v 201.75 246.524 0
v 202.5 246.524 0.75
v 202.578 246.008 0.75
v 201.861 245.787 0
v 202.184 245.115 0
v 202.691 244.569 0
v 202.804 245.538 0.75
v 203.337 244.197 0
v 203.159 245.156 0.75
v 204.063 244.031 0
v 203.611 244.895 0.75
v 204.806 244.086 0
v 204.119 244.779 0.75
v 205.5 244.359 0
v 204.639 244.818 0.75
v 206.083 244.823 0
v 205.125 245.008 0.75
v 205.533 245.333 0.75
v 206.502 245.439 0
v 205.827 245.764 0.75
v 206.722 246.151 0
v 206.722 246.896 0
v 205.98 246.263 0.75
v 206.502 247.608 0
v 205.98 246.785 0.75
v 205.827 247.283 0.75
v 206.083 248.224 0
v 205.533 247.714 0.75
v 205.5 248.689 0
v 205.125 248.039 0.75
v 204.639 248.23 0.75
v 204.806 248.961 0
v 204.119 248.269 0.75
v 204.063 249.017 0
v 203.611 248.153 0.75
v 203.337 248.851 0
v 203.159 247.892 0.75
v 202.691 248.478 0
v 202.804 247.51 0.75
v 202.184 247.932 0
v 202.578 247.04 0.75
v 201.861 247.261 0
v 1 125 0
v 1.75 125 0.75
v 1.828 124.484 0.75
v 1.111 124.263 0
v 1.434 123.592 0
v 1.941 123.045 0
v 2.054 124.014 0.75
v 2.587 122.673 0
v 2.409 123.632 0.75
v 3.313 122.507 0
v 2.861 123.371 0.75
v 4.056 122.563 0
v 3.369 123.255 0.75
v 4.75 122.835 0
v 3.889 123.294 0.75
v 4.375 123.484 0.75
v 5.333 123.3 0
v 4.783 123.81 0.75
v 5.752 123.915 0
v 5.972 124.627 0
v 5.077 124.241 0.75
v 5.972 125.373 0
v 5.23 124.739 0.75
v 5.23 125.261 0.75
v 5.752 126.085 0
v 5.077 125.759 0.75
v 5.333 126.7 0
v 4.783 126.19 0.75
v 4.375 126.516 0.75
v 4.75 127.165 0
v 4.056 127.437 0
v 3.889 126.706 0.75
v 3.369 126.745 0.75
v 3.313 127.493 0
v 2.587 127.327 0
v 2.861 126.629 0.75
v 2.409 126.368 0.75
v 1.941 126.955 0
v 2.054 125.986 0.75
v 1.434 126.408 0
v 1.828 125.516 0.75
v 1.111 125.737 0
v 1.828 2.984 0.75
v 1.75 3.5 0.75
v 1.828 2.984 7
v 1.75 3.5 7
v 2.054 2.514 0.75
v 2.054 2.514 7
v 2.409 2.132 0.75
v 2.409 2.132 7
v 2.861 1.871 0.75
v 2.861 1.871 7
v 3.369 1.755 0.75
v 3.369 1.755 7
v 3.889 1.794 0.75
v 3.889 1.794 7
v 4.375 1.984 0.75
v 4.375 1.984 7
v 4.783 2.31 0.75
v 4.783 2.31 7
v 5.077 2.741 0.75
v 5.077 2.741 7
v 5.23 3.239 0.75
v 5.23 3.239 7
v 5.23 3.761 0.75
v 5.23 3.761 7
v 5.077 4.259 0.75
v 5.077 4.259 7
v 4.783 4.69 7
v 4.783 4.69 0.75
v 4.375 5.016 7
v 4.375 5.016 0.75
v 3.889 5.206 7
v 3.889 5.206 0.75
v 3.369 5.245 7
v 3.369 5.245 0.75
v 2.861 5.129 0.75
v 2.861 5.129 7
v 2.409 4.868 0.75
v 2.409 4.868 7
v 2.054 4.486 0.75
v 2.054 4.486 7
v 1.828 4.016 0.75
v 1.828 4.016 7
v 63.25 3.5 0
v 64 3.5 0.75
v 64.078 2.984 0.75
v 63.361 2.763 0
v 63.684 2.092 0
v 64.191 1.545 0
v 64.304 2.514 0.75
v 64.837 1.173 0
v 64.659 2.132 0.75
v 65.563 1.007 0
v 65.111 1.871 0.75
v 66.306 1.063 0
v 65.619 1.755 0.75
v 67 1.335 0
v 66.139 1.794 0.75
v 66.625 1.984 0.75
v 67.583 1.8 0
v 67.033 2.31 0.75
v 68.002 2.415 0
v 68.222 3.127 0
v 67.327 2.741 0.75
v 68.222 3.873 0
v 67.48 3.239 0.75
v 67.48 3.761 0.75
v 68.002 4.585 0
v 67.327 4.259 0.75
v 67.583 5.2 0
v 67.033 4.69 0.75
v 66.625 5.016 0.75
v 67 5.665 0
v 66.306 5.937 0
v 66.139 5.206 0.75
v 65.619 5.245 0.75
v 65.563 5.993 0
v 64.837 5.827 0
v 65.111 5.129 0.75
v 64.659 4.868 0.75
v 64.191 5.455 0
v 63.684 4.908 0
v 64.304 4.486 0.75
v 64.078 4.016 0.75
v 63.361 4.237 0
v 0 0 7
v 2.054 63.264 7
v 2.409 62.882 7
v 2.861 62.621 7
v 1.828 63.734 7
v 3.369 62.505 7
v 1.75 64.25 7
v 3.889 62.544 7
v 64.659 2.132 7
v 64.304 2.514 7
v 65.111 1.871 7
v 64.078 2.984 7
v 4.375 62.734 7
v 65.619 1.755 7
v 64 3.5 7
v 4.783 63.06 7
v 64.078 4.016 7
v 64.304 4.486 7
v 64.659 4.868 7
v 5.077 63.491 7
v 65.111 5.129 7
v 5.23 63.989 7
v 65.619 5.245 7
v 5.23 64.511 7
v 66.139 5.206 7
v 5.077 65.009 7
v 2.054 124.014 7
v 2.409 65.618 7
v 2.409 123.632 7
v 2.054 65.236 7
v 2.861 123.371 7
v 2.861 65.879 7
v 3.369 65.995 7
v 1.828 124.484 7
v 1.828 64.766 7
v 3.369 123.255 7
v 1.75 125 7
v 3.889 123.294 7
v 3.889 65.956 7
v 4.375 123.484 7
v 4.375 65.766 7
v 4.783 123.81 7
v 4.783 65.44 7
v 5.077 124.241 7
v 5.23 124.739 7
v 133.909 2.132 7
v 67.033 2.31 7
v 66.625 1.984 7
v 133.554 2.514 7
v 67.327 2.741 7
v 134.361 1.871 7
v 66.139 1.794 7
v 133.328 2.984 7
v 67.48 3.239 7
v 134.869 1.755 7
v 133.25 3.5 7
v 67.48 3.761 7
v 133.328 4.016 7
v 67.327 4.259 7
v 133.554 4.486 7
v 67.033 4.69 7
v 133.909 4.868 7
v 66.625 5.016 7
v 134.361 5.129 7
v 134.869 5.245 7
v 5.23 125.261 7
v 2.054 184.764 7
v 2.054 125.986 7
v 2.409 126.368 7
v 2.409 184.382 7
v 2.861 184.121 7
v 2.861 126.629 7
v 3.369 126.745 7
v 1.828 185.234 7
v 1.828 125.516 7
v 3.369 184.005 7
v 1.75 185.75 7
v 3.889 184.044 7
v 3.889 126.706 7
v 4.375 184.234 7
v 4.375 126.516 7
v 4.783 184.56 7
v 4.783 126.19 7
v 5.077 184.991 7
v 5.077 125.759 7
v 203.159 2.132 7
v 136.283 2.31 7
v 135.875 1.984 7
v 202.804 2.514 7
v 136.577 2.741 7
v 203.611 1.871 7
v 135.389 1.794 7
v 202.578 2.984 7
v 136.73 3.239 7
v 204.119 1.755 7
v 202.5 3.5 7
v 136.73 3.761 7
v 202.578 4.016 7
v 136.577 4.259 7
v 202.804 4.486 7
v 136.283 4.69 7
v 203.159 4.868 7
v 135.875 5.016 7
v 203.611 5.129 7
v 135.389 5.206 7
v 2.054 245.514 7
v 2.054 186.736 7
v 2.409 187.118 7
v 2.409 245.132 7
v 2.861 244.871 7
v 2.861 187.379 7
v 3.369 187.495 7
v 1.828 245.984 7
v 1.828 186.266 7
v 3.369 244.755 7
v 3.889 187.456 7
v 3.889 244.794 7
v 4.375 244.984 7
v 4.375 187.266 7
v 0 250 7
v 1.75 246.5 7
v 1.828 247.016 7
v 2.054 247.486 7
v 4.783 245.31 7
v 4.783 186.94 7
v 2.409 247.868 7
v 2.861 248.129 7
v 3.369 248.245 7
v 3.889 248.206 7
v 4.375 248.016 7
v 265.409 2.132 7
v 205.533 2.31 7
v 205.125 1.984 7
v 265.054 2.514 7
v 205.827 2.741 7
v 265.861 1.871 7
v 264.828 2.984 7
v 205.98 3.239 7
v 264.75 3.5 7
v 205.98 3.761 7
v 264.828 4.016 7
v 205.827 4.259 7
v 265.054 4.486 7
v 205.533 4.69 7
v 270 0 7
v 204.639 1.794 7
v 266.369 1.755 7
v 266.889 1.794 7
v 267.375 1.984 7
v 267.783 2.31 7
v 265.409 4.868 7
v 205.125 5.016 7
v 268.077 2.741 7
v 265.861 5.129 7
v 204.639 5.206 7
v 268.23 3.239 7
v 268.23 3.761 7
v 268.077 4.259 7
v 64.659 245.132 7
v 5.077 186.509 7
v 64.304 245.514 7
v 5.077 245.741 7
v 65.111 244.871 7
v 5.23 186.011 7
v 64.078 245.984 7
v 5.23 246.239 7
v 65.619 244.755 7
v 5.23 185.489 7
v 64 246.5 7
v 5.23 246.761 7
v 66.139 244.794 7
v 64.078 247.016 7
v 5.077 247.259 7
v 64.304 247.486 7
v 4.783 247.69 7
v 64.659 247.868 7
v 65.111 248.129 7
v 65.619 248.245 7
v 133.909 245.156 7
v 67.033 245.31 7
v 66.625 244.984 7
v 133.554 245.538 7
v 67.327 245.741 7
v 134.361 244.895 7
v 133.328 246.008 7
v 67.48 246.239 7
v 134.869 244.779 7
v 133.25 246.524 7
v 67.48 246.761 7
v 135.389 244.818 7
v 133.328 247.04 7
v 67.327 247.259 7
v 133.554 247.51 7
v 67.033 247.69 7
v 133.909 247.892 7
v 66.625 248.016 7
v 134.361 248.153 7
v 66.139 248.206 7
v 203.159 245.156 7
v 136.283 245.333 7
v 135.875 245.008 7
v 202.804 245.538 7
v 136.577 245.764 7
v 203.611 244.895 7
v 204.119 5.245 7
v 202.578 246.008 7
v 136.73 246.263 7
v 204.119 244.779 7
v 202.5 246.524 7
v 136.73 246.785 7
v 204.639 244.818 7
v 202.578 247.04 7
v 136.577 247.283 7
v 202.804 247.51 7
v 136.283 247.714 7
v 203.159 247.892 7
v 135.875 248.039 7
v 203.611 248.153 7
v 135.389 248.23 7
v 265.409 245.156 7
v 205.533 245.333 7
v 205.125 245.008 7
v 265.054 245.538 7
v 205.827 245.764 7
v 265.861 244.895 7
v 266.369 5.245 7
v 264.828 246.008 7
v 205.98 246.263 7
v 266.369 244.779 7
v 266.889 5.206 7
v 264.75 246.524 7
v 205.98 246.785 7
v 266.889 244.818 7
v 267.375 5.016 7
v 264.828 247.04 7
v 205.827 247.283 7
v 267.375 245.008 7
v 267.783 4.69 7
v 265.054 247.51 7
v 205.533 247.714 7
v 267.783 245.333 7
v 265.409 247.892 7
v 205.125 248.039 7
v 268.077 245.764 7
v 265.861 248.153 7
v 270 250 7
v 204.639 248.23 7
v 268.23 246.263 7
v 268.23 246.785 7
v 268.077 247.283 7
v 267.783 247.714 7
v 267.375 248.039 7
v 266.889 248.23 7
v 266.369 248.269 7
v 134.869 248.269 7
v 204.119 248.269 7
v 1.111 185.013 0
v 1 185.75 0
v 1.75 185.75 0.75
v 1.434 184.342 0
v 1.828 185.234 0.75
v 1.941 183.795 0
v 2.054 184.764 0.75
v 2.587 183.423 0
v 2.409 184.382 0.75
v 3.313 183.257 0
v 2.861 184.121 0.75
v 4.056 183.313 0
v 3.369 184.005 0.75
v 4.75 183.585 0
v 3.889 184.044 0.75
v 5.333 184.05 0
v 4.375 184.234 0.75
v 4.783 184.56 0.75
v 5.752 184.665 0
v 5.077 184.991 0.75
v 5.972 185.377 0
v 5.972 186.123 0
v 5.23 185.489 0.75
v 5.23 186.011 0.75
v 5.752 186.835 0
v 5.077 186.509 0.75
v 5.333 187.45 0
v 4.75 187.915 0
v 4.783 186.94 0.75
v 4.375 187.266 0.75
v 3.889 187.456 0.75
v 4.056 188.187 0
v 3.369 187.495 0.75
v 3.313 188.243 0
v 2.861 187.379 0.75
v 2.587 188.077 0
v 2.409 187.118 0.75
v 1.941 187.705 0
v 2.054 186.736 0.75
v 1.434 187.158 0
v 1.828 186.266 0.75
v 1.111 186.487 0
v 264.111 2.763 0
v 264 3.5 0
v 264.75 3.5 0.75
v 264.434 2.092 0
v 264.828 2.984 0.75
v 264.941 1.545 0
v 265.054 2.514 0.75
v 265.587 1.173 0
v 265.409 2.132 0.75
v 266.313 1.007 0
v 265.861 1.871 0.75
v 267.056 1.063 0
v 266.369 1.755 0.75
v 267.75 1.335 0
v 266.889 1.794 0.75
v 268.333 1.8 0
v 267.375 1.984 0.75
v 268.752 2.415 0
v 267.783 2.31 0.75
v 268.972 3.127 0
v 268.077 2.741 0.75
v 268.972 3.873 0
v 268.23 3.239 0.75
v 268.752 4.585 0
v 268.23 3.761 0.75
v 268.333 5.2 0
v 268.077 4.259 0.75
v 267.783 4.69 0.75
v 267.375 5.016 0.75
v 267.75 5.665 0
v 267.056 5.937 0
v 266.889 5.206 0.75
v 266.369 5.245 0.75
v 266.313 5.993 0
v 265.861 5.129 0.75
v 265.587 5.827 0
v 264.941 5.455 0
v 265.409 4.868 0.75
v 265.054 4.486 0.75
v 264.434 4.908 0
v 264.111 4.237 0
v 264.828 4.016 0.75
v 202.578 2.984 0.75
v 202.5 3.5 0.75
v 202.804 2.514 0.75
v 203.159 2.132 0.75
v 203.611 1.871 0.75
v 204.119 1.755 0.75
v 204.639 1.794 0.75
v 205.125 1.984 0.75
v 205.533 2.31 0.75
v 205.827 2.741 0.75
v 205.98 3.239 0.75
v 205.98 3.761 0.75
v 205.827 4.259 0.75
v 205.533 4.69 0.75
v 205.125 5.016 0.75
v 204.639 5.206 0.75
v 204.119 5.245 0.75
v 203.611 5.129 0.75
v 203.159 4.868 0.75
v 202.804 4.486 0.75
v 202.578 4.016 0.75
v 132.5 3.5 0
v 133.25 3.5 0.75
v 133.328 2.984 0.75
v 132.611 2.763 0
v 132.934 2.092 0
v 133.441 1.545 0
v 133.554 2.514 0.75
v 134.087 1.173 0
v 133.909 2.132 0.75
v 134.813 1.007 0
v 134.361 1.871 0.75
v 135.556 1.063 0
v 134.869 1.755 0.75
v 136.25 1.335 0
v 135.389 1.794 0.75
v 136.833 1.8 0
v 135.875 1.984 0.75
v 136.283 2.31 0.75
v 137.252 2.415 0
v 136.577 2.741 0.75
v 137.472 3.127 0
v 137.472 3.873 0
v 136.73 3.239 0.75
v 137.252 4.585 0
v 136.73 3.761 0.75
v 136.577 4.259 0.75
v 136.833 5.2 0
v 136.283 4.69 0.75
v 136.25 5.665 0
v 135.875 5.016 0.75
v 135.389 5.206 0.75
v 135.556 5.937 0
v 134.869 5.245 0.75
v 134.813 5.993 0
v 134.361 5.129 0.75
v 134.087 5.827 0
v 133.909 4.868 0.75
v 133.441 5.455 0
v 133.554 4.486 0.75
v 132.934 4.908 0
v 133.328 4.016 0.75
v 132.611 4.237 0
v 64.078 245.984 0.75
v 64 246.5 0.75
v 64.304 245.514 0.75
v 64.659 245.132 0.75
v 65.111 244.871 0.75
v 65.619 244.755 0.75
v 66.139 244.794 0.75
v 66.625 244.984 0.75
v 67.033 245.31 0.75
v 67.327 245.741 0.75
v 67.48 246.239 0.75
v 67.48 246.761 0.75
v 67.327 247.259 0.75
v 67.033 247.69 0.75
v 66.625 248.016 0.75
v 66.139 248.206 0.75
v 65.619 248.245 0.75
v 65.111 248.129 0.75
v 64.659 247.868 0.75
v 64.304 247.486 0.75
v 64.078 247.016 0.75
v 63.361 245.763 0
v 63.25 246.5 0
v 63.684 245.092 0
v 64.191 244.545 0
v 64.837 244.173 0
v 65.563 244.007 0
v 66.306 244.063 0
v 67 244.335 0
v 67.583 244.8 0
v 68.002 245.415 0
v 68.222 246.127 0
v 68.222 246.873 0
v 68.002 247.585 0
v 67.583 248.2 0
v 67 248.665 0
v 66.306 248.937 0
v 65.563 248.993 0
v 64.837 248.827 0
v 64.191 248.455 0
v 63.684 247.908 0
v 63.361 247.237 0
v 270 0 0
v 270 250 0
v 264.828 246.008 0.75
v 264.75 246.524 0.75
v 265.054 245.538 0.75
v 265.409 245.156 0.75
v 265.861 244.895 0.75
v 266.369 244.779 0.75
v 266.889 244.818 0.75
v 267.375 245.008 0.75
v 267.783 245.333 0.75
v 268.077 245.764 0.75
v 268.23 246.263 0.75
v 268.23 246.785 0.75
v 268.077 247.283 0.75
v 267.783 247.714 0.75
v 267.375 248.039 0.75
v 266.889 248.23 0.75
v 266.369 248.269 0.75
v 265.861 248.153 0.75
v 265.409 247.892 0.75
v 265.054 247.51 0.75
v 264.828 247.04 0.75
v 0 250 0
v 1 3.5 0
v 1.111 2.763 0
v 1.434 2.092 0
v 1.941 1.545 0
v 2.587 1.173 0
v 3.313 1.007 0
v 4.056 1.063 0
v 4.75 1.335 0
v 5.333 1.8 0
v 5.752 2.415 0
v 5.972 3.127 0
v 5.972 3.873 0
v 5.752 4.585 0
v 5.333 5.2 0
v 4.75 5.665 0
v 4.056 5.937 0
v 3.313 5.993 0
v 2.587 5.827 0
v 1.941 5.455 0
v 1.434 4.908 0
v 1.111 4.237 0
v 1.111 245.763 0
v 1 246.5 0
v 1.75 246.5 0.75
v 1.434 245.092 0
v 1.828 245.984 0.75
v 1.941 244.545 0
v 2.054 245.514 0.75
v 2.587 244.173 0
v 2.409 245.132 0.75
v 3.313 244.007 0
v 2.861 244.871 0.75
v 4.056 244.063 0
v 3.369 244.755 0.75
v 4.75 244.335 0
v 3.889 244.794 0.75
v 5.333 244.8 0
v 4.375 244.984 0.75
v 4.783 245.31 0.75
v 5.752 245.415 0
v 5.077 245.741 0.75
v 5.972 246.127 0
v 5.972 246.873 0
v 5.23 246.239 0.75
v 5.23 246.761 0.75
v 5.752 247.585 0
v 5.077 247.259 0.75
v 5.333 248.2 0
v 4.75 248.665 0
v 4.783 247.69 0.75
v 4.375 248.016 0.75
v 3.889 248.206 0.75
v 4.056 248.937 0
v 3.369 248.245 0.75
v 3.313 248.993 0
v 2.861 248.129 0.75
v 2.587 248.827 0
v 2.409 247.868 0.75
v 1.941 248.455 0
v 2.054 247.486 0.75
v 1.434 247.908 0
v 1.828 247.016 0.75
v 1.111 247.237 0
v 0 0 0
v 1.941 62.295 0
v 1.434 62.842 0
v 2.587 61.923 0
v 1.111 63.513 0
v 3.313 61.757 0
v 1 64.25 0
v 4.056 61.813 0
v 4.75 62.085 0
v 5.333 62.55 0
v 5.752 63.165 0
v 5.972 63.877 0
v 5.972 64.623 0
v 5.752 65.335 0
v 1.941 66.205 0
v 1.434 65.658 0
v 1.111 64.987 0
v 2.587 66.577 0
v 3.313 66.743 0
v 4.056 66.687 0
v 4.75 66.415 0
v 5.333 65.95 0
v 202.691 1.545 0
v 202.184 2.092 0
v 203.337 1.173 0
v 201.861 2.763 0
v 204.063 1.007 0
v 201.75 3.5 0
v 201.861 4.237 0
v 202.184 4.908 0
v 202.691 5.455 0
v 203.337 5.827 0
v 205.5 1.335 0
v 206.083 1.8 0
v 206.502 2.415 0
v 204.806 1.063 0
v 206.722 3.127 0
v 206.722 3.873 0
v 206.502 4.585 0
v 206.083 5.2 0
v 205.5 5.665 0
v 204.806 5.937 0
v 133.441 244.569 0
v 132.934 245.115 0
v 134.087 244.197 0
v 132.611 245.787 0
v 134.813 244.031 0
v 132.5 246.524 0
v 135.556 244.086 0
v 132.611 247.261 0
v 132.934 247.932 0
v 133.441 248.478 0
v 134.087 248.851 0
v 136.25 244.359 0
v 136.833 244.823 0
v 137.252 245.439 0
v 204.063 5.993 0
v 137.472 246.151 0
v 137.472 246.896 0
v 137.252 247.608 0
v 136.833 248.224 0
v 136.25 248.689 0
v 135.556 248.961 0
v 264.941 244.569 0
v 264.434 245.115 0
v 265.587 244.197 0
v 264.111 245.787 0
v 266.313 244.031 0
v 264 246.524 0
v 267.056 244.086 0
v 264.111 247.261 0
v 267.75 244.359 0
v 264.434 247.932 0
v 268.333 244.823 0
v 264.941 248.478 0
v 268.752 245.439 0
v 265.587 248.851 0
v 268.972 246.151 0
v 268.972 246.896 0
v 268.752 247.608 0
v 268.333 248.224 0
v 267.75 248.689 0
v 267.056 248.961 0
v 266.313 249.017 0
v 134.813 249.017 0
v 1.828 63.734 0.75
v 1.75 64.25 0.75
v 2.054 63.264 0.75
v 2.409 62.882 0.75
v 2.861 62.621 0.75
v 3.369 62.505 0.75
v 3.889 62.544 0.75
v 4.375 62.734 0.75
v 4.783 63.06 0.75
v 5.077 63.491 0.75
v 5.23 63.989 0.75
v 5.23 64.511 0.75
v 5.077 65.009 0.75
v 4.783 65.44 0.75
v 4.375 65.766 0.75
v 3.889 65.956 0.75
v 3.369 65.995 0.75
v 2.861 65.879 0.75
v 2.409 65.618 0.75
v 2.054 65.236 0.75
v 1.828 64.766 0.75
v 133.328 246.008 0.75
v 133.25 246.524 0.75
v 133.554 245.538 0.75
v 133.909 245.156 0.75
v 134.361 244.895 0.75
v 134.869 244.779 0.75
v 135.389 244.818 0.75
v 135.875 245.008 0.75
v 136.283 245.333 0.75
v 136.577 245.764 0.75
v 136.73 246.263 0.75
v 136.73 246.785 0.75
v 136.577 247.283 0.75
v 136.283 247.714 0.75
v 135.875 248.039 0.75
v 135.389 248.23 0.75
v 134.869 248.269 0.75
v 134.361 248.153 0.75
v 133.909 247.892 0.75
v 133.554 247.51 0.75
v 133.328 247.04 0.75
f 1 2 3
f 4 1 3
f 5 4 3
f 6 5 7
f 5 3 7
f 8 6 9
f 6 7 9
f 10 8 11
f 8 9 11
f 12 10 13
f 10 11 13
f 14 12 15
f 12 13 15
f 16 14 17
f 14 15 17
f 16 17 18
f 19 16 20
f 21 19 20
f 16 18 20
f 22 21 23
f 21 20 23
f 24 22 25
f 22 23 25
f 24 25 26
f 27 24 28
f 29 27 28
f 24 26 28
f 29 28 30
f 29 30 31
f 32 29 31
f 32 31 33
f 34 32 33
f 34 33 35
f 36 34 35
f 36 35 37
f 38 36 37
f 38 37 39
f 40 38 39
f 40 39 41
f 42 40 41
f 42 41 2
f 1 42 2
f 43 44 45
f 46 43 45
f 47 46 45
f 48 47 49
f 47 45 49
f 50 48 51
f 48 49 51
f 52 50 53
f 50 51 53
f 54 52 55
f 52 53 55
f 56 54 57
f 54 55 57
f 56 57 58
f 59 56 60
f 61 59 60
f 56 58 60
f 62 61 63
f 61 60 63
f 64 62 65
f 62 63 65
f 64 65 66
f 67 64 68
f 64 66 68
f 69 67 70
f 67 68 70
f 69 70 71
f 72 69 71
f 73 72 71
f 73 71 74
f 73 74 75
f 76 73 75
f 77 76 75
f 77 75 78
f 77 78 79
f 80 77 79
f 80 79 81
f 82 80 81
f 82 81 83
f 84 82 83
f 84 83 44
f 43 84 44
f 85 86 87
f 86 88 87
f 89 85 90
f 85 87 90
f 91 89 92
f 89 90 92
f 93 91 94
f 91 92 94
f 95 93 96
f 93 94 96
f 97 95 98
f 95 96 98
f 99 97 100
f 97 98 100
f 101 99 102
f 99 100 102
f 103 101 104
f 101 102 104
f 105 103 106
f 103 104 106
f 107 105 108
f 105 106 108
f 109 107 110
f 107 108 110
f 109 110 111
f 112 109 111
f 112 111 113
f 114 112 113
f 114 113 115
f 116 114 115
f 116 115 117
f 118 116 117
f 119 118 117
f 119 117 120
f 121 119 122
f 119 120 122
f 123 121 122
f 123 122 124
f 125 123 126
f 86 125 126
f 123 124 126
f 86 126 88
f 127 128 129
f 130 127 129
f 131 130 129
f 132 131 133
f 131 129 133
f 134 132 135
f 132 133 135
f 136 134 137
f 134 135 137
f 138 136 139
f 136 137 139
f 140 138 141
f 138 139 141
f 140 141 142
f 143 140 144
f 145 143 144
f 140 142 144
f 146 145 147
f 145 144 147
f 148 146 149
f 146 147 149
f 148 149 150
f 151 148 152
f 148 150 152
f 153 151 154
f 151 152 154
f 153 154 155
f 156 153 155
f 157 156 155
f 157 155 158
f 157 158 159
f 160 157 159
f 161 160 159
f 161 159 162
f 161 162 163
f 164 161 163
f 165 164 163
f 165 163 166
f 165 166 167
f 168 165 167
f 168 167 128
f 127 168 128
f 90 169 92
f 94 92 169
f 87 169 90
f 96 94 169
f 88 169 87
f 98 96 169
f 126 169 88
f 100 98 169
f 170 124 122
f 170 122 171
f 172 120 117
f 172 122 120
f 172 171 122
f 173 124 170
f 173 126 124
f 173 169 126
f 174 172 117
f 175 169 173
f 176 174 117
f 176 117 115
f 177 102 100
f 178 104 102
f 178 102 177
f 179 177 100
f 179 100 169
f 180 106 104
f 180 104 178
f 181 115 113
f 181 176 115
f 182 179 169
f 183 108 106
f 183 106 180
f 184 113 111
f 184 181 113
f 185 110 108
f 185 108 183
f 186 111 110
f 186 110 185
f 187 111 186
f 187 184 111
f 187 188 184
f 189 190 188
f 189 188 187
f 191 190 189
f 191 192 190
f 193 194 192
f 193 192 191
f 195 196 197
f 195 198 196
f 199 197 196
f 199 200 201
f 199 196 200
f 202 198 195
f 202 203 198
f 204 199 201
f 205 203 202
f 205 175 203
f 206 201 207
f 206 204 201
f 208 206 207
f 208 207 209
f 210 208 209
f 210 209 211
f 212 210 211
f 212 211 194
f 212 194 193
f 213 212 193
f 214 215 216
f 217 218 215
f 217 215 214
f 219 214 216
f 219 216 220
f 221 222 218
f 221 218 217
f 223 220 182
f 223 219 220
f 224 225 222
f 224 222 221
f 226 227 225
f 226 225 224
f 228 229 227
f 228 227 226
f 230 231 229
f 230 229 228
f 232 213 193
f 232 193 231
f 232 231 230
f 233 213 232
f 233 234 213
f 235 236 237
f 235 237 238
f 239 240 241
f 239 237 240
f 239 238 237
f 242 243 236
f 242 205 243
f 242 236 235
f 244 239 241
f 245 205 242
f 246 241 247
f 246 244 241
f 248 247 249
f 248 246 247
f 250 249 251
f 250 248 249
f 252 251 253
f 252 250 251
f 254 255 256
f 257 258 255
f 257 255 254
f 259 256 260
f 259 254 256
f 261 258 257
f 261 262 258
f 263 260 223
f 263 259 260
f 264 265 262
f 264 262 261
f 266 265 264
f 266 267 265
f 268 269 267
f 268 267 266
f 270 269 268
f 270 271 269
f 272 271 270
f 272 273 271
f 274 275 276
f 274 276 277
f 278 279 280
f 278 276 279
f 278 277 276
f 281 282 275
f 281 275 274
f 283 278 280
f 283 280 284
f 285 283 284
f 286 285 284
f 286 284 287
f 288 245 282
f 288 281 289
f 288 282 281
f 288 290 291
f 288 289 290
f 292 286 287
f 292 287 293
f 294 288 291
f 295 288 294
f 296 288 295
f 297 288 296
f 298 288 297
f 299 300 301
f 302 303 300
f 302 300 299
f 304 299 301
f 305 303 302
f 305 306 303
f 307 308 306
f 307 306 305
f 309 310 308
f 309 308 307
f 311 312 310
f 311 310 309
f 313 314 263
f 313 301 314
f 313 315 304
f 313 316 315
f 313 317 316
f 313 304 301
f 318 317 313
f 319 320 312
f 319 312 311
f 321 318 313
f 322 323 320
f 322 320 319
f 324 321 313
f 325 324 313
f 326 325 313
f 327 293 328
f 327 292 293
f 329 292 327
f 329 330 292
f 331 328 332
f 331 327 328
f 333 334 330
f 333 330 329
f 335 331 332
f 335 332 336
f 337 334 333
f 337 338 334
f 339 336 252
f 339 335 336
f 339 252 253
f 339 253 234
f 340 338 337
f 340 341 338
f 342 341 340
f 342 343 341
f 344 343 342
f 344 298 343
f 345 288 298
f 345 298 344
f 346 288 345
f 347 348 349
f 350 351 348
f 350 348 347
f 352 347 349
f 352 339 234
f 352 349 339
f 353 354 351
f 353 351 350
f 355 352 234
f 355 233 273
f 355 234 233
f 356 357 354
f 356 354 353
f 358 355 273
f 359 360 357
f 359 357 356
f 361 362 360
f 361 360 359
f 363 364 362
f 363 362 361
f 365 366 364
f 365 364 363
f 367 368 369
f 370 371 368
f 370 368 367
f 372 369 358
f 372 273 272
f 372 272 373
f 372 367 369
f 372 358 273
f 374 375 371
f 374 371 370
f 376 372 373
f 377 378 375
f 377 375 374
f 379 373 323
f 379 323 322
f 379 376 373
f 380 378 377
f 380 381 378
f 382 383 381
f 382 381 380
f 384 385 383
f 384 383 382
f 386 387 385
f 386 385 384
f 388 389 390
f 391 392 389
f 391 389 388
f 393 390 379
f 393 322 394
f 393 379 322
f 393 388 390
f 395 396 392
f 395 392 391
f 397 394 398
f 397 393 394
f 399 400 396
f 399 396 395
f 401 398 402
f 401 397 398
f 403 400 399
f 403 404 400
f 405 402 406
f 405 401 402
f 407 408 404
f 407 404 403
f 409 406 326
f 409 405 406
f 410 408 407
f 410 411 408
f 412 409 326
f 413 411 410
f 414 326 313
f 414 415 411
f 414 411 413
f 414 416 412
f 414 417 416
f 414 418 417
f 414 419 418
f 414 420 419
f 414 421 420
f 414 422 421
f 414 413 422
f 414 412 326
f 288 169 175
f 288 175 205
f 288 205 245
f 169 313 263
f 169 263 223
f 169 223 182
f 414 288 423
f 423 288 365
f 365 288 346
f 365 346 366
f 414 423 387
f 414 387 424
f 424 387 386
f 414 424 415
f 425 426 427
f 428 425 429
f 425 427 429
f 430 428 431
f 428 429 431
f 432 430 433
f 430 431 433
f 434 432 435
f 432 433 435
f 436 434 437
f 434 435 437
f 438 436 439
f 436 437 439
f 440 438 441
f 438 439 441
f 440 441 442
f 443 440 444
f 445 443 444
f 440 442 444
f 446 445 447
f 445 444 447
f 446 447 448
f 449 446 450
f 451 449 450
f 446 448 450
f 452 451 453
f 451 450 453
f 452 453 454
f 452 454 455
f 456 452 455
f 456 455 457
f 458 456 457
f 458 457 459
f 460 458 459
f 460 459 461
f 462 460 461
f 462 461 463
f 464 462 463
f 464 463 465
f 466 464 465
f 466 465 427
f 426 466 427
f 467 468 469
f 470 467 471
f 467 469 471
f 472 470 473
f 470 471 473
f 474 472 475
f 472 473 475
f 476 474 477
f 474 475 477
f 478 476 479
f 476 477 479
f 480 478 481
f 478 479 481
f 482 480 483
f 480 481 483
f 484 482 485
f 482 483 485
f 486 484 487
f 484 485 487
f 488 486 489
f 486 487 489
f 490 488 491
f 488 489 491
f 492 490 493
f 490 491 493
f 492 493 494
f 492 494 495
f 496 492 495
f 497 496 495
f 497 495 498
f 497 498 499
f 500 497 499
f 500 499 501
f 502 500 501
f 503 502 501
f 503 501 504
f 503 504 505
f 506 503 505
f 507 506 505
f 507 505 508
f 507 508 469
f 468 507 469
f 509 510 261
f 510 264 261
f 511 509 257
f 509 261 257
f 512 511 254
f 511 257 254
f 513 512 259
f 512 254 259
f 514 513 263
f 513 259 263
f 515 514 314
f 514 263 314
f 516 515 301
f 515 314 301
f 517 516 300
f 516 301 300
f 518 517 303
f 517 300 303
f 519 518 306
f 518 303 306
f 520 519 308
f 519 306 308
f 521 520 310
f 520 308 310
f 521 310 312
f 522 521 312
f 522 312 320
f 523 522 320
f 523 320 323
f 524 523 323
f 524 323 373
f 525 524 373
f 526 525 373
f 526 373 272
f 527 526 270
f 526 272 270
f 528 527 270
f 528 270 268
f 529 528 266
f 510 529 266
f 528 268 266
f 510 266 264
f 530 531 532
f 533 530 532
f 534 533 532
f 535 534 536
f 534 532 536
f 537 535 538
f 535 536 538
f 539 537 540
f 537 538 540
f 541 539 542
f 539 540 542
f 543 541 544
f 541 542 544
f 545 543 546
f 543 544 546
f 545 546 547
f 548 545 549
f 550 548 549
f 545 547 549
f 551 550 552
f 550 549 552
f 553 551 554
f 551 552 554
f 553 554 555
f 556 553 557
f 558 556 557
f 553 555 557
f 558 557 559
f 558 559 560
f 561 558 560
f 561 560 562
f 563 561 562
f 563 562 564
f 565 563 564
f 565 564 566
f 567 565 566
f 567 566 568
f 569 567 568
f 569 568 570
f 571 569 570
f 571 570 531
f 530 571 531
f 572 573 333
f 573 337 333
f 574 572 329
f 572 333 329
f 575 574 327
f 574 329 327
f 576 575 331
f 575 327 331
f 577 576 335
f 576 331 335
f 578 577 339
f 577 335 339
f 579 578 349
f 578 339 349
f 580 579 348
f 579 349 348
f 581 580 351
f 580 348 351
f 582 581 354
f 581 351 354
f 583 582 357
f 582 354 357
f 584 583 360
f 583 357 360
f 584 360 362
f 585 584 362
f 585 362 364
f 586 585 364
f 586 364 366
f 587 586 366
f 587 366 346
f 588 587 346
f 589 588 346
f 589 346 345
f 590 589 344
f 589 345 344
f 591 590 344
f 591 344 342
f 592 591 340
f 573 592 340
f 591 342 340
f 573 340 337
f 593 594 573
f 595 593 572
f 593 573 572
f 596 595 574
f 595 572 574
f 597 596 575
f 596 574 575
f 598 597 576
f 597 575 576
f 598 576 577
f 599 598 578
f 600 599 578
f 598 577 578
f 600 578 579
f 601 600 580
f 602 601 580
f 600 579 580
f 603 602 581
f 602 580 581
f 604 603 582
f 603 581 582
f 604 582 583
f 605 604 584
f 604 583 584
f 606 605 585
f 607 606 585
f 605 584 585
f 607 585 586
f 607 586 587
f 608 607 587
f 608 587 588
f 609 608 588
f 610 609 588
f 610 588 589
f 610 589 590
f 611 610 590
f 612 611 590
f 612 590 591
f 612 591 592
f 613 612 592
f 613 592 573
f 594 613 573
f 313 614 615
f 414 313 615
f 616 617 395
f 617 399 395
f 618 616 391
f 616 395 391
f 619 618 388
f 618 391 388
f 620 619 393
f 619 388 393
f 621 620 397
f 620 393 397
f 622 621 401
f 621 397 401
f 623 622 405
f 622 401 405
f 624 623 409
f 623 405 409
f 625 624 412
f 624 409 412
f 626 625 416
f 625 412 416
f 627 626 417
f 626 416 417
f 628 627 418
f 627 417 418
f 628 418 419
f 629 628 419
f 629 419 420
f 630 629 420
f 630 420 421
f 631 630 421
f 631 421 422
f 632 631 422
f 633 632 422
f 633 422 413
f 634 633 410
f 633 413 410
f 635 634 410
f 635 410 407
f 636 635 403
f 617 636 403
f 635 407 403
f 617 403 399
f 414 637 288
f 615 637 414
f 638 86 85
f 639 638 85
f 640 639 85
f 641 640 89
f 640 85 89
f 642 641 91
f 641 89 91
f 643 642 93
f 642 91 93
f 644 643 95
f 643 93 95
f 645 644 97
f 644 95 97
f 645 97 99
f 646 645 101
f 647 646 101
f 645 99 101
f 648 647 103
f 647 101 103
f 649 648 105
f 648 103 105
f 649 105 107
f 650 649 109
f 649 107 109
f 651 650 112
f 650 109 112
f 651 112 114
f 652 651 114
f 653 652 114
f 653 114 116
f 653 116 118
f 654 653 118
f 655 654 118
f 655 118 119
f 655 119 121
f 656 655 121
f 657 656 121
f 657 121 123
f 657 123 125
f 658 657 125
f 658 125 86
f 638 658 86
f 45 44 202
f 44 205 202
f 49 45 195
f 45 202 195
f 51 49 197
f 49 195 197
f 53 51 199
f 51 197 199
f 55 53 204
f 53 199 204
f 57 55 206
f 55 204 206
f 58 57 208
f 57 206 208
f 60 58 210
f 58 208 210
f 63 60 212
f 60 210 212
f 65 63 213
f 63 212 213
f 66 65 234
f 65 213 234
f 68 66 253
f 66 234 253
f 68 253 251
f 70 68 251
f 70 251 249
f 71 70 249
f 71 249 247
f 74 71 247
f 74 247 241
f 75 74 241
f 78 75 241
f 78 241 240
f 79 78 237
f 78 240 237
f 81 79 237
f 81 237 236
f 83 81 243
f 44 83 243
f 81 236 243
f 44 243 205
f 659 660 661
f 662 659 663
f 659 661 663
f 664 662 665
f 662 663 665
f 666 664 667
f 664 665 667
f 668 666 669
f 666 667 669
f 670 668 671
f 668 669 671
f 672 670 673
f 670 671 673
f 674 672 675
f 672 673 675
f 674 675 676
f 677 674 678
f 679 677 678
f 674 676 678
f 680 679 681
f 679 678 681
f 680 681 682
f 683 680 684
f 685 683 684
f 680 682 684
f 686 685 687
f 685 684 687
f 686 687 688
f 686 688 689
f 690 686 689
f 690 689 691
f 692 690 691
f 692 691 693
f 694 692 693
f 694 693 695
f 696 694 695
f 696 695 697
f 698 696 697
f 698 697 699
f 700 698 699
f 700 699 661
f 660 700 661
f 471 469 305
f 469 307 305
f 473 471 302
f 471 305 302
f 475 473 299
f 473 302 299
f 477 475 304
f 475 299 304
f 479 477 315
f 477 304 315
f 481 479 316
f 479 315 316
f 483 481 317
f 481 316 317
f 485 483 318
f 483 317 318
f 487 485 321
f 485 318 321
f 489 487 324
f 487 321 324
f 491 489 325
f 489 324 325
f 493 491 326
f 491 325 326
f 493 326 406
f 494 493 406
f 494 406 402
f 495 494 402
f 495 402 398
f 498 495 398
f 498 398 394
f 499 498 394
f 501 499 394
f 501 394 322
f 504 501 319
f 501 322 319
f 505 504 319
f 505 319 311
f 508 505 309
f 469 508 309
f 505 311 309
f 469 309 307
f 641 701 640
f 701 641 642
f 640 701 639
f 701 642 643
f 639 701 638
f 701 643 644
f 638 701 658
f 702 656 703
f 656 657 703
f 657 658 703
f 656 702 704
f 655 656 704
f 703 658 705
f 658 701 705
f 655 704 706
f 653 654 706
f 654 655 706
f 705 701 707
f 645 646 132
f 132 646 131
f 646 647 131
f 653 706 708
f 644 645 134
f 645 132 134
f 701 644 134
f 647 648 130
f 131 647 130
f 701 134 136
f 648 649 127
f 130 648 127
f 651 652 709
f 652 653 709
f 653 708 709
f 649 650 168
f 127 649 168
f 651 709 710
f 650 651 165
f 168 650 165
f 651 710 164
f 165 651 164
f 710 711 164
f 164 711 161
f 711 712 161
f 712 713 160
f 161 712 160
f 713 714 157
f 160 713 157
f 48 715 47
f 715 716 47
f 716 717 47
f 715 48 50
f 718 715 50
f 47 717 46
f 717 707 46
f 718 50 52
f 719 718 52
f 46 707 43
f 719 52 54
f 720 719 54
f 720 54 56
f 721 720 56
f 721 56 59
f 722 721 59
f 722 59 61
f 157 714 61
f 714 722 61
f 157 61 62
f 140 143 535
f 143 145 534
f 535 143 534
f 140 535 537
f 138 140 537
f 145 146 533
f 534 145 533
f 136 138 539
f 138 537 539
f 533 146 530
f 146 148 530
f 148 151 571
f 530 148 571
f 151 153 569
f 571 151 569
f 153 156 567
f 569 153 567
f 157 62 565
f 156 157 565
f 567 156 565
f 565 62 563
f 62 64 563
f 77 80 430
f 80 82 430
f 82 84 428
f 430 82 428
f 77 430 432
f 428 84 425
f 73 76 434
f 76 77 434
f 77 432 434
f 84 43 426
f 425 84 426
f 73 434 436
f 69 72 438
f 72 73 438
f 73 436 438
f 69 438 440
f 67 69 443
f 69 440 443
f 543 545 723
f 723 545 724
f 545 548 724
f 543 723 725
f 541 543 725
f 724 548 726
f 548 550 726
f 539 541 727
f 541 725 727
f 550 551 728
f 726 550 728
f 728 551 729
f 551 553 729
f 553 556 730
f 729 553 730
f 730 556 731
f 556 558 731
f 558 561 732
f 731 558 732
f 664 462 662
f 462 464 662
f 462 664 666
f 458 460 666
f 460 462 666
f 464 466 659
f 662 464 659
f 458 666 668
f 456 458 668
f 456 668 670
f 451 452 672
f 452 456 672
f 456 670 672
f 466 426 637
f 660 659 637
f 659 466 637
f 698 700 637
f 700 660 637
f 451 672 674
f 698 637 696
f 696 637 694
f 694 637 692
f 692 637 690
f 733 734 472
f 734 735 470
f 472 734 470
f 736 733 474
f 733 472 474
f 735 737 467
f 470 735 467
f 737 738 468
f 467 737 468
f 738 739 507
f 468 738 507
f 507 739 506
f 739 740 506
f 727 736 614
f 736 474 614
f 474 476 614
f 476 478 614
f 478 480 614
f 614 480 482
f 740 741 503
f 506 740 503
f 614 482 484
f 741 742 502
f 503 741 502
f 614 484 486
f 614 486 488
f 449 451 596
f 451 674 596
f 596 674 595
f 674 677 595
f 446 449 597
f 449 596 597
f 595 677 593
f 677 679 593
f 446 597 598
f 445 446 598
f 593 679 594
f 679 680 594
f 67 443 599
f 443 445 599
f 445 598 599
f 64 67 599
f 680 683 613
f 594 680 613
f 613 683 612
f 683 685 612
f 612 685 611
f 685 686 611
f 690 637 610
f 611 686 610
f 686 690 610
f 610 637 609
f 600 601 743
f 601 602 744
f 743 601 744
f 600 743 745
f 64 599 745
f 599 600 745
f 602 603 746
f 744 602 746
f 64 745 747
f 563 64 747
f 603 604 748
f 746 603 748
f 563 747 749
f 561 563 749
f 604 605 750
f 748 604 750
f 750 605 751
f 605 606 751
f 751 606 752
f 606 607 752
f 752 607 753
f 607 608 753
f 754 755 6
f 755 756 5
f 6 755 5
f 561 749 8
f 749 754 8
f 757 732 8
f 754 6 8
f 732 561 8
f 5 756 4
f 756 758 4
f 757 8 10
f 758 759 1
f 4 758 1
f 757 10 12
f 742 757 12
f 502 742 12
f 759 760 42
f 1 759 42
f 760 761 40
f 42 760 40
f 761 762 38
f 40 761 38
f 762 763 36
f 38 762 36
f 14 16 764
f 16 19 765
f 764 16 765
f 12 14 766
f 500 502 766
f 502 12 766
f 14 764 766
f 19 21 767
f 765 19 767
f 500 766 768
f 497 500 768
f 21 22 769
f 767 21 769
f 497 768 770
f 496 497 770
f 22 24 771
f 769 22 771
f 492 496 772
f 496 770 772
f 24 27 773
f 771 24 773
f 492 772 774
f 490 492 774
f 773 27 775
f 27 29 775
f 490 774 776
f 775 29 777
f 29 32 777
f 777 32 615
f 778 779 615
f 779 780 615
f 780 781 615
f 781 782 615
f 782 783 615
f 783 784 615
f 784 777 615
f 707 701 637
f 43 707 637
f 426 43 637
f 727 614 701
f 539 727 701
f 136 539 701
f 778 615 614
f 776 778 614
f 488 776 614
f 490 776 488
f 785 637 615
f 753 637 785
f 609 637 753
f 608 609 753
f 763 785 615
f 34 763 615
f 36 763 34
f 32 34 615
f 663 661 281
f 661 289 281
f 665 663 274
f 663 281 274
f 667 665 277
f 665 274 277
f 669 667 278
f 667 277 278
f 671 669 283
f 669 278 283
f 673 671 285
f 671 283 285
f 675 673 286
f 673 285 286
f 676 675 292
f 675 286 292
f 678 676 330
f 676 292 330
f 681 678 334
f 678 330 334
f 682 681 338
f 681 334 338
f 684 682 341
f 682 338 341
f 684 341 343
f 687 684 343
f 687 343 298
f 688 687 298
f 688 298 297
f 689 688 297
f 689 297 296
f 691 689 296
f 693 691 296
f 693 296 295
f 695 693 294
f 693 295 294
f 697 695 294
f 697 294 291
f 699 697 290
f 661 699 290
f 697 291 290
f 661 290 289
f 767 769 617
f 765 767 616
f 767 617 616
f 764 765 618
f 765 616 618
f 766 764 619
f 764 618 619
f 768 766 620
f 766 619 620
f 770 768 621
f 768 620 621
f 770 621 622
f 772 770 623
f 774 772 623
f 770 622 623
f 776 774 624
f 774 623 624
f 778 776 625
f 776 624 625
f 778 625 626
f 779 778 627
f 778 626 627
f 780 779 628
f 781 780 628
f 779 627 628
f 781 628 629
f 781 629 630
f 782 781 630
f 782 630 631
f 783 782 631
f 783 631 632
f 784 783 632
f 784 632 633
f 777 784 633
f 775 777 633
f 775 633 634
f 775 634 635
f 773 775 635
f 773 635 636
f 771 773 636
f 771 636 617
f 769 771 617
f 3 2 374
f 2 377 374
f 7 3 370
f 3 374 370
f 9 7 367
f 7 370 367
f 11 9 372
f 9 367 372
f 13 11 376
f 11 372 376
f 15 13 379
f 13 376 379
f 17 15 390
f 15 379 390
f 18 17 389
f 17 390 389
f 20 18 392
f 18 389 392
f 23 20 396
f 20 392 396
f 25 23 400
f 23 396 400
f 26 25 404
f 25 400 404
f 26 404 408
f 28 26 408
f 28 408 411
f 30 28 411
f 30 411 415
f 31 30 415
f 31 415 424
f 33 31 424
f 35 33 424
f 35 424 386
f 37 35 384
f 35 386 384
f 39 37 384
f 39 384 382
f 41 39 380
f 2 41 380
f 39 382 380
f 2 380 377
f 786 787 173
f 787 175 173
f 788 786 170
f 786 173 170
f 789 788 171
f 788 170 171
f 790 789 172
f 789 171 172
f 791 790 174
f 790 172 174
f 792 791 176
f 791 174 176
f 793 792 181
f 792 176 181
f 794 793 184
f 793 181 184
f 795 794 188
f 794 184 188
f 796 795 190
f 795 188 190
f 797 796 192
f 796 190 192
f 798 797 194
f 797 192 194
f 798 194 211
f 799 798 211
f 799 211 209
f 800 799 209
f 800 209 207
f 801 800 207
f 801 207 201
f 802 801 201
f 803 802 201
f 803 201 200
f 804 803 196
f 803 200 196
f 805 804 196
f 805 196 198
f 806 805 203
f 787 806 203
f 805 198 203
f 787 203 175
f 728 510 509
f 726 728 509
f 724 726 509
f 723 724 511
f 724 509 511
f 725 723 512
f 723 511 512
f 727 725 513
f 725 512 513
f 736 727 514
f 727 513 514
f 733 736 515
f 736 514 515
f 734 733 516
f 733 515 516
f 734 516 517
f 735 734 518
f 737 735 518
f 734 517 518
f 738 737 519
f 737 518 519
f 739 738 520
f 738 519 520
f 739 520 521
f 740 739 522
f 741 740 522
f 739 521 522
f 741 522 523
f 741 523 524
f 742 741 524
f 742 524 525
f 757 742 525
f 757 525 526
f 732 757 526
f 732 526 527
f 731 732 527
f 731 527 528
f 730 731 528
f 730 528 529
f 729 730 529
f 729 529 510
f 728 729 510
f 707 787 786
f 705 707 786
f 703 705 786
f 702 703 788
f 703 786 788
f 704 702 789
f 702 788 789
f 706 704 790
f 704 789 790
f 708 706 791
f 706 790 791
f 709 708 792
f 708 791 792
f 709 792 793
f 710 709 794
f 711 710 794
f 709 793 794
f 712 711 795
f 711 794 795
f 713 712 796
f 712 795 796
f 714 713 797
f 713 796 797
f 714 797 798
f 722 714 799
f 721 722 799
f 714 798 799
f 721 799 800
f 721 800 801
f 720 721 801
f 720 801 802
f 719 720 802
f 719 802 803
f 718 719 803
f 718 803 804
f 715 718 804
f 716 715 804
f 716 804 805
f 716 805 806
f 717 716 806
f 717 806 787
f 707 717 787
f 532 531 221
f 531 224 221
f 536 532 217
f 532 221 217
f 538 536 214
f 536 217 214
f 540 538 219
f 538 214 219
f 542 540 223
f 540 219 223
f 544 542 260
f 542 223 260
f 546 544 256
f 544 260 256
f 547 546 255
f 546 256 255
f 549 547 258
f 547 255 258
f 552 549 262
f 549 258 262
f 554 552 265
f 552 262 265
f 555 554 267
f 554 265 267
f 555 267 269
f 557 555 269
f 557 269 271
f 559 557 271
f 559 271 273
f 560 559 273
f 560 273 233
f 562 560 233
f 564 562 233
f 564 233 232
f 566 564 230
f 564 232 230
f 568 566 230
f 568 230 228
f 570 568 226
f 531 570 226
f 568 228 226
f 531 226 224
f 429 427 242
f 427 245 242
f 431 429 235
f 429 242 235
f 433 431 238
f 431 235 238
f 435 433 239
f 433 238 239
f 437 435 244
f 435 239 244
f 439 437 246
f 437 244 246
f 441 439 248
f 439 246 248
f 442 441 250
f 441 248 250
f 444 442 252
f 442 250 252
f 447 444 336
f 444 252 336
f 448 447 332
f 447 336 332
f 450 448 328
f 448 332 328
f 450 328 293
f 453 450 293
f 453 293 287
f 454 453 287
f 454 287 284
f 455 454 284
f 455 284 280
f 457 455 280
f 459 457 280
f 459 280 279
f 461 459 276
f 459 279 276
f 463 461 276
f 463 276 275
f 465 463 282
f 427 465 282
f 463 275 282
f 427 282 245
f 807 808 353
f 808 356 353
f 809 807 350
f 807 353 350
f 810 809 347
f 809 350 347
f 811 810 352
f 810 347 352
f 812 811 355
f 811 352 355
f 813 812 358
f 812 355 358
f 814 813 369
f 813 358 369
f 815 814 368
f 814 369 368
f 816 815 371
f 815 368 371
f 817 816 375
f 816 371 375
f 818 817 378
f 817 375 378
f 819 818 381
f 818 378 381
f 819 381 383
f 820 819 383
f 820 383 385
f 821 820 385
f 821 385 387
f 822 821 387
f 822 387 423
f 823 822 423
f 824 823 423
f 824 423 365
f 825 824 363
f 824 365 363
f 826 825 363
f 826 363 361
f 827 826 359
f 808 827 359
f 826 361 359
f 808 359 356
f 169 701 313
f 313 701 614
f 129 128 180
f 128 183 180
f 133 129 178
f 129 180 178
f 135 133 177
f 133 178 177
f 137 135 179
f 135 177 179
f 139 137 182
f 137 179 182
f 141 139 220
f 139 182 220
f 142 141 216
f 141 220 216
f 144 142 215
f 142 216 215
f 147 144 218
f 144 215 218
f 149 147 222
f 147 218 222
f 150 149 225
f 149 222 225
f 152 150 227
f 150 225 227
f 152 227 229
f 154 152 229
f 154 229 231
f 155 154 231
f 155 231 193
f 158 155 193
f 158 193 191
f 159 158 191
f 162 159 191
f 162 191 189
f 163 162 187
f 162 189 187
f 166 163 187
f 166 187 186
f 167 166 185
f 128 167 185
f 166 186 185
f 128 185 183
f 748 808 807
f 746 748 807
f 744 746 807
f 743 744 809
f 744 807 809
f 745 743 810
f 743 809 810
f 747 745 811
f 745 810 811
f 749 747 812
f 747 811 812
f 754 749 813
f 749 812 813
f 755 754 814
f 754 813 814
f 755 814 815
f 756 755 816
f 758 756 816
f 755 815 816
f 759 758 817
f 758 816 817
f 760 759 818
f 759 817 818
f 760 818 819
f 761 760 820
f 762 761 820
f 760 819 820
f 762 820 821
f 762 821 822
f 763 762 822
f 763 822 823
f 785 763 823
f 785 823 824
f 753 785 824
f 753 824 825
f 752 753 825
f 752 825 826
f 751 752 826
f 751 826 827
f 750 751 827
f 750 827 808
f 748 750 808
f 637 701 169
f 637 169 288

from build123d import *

# Parameters (mm, degrees)
F0_W            = 270
F0_H            = 250
F4_REACH        = 517.9673898595
F5_W            = 263
F5_H            = 236
F6_DEPTH        = 36
F8_DEPTH        = 250.001
F10_D           = 3.5
F10_DEPTH       = 12
F10_TIP         = 1.0515060833
F13_W           = 270
F13_H           = 250
F14_DEPTH       = 7
F15_D           = 3.5
F15_CSINK_D     = 5
F15_CSINK_ANGLE = 90


with BuildPart() as f4:
    f4_end = Plane(origin=(25.6515107494, 0, -145.4769465589), x_dir=(0.984807753, 0, 0.1736481777), z_dir=(-0.1736481777, 0, 0.984807753))
    # F0 (on Top) → F4 (new body, up to a plane its end follows)
    with BuildSketch(Plane.XY):
        with Locations((135, 125)):
            Rectangle(F0_W, F0_H)
    f4_long = extrude(amount=-F4_REACH, mode=Mode.PRIVATE)
    add(split(f4_long, bisect_by=f4_end, keep=Keep.TOP, mode=Mode.PRIVATE))

    # F5 (on face) → F6 (cut)
    with BuildSketch(Plane.XY):
        with Locations((138.5, 125)):
            Rectangle(F5_W, F5_H)
    extrude(amount=-F6_DEPTH, mode=Mode.SUBTRACT)

    # F7 (on face) → F8 (cut, through all)
    with BuildSketch(Plane.XZ):
        with BuildLine():
            Line((270, -42.8751187269), (216.5270364467, -52.3038449398))
            ThreePointArc((216.5270364467, -52.3038449398), (200.3038449398, -75.4729635533), (223.4729635533, -91.6961550602))
            Line((223.4729635533, -91.6961550602), (270, -83.4921832023))
            Line((270, -83.4921832023), (270, -42.8751187269))
        make_face()
    extrude(amount=-F8_DEPTH, mode=Mode.SUBTRACT)

    # F10
    with Locations(Plane.XY):
        with Locations((3.5, 64.25), (3.5, 125), (3.5, 185.75), (3.5, 246.5), (3.5, 3.5), (65.75, 3.5), (135, 3.5), (204.25, 3.5), (266.5, 3.5), (266.500000929, 246.5237677097), (204.25, 246.5237677097), (135, 246.5237677097), (65.75, 246.5)):
            Hole(F10_D / 2, depth=F10_DEPTH)
            with Locations((0, 0, -(F10_DEPTH + F10_TIP / 2))):  # 118° drill point
                Cone(0, F10_D / 2, F10_TIP, mode=Mode.SUBTRACT)


with BuildPart() as f14:
    # F13 (on face) → F14 (new body)
    with BuildSketch(Plane.XY):
        with Locations((135, 125)):
            Rectangle(F13_W, F13_H)
    extrude(amount=F14_DEPTH)

    # F15 (through all)
    with Locations(Plane(origin=(0, 0, 0), x_dir=(1, 0, 0), z_dir=(0, 0, -1))):
        with Locations((3.5, -246.5), (65.75, -246.5), (135, -246.5237677097), (204.25, -246.5237677097), (266.500000929, -246.5237677097), (3.5, -185.75), (3.5, -125), (3.5, -64.25), (3.5, -3.5), (65.75, -3.5), (135, -3.5), (204.25, -3.5), (266.5, -3.5)):
            CounterSinkHole(F15_D / 2, F15_CSINK_D / 2, counter_sink_angle=F15_CSINK_ANGLE)


solid = f14.part
